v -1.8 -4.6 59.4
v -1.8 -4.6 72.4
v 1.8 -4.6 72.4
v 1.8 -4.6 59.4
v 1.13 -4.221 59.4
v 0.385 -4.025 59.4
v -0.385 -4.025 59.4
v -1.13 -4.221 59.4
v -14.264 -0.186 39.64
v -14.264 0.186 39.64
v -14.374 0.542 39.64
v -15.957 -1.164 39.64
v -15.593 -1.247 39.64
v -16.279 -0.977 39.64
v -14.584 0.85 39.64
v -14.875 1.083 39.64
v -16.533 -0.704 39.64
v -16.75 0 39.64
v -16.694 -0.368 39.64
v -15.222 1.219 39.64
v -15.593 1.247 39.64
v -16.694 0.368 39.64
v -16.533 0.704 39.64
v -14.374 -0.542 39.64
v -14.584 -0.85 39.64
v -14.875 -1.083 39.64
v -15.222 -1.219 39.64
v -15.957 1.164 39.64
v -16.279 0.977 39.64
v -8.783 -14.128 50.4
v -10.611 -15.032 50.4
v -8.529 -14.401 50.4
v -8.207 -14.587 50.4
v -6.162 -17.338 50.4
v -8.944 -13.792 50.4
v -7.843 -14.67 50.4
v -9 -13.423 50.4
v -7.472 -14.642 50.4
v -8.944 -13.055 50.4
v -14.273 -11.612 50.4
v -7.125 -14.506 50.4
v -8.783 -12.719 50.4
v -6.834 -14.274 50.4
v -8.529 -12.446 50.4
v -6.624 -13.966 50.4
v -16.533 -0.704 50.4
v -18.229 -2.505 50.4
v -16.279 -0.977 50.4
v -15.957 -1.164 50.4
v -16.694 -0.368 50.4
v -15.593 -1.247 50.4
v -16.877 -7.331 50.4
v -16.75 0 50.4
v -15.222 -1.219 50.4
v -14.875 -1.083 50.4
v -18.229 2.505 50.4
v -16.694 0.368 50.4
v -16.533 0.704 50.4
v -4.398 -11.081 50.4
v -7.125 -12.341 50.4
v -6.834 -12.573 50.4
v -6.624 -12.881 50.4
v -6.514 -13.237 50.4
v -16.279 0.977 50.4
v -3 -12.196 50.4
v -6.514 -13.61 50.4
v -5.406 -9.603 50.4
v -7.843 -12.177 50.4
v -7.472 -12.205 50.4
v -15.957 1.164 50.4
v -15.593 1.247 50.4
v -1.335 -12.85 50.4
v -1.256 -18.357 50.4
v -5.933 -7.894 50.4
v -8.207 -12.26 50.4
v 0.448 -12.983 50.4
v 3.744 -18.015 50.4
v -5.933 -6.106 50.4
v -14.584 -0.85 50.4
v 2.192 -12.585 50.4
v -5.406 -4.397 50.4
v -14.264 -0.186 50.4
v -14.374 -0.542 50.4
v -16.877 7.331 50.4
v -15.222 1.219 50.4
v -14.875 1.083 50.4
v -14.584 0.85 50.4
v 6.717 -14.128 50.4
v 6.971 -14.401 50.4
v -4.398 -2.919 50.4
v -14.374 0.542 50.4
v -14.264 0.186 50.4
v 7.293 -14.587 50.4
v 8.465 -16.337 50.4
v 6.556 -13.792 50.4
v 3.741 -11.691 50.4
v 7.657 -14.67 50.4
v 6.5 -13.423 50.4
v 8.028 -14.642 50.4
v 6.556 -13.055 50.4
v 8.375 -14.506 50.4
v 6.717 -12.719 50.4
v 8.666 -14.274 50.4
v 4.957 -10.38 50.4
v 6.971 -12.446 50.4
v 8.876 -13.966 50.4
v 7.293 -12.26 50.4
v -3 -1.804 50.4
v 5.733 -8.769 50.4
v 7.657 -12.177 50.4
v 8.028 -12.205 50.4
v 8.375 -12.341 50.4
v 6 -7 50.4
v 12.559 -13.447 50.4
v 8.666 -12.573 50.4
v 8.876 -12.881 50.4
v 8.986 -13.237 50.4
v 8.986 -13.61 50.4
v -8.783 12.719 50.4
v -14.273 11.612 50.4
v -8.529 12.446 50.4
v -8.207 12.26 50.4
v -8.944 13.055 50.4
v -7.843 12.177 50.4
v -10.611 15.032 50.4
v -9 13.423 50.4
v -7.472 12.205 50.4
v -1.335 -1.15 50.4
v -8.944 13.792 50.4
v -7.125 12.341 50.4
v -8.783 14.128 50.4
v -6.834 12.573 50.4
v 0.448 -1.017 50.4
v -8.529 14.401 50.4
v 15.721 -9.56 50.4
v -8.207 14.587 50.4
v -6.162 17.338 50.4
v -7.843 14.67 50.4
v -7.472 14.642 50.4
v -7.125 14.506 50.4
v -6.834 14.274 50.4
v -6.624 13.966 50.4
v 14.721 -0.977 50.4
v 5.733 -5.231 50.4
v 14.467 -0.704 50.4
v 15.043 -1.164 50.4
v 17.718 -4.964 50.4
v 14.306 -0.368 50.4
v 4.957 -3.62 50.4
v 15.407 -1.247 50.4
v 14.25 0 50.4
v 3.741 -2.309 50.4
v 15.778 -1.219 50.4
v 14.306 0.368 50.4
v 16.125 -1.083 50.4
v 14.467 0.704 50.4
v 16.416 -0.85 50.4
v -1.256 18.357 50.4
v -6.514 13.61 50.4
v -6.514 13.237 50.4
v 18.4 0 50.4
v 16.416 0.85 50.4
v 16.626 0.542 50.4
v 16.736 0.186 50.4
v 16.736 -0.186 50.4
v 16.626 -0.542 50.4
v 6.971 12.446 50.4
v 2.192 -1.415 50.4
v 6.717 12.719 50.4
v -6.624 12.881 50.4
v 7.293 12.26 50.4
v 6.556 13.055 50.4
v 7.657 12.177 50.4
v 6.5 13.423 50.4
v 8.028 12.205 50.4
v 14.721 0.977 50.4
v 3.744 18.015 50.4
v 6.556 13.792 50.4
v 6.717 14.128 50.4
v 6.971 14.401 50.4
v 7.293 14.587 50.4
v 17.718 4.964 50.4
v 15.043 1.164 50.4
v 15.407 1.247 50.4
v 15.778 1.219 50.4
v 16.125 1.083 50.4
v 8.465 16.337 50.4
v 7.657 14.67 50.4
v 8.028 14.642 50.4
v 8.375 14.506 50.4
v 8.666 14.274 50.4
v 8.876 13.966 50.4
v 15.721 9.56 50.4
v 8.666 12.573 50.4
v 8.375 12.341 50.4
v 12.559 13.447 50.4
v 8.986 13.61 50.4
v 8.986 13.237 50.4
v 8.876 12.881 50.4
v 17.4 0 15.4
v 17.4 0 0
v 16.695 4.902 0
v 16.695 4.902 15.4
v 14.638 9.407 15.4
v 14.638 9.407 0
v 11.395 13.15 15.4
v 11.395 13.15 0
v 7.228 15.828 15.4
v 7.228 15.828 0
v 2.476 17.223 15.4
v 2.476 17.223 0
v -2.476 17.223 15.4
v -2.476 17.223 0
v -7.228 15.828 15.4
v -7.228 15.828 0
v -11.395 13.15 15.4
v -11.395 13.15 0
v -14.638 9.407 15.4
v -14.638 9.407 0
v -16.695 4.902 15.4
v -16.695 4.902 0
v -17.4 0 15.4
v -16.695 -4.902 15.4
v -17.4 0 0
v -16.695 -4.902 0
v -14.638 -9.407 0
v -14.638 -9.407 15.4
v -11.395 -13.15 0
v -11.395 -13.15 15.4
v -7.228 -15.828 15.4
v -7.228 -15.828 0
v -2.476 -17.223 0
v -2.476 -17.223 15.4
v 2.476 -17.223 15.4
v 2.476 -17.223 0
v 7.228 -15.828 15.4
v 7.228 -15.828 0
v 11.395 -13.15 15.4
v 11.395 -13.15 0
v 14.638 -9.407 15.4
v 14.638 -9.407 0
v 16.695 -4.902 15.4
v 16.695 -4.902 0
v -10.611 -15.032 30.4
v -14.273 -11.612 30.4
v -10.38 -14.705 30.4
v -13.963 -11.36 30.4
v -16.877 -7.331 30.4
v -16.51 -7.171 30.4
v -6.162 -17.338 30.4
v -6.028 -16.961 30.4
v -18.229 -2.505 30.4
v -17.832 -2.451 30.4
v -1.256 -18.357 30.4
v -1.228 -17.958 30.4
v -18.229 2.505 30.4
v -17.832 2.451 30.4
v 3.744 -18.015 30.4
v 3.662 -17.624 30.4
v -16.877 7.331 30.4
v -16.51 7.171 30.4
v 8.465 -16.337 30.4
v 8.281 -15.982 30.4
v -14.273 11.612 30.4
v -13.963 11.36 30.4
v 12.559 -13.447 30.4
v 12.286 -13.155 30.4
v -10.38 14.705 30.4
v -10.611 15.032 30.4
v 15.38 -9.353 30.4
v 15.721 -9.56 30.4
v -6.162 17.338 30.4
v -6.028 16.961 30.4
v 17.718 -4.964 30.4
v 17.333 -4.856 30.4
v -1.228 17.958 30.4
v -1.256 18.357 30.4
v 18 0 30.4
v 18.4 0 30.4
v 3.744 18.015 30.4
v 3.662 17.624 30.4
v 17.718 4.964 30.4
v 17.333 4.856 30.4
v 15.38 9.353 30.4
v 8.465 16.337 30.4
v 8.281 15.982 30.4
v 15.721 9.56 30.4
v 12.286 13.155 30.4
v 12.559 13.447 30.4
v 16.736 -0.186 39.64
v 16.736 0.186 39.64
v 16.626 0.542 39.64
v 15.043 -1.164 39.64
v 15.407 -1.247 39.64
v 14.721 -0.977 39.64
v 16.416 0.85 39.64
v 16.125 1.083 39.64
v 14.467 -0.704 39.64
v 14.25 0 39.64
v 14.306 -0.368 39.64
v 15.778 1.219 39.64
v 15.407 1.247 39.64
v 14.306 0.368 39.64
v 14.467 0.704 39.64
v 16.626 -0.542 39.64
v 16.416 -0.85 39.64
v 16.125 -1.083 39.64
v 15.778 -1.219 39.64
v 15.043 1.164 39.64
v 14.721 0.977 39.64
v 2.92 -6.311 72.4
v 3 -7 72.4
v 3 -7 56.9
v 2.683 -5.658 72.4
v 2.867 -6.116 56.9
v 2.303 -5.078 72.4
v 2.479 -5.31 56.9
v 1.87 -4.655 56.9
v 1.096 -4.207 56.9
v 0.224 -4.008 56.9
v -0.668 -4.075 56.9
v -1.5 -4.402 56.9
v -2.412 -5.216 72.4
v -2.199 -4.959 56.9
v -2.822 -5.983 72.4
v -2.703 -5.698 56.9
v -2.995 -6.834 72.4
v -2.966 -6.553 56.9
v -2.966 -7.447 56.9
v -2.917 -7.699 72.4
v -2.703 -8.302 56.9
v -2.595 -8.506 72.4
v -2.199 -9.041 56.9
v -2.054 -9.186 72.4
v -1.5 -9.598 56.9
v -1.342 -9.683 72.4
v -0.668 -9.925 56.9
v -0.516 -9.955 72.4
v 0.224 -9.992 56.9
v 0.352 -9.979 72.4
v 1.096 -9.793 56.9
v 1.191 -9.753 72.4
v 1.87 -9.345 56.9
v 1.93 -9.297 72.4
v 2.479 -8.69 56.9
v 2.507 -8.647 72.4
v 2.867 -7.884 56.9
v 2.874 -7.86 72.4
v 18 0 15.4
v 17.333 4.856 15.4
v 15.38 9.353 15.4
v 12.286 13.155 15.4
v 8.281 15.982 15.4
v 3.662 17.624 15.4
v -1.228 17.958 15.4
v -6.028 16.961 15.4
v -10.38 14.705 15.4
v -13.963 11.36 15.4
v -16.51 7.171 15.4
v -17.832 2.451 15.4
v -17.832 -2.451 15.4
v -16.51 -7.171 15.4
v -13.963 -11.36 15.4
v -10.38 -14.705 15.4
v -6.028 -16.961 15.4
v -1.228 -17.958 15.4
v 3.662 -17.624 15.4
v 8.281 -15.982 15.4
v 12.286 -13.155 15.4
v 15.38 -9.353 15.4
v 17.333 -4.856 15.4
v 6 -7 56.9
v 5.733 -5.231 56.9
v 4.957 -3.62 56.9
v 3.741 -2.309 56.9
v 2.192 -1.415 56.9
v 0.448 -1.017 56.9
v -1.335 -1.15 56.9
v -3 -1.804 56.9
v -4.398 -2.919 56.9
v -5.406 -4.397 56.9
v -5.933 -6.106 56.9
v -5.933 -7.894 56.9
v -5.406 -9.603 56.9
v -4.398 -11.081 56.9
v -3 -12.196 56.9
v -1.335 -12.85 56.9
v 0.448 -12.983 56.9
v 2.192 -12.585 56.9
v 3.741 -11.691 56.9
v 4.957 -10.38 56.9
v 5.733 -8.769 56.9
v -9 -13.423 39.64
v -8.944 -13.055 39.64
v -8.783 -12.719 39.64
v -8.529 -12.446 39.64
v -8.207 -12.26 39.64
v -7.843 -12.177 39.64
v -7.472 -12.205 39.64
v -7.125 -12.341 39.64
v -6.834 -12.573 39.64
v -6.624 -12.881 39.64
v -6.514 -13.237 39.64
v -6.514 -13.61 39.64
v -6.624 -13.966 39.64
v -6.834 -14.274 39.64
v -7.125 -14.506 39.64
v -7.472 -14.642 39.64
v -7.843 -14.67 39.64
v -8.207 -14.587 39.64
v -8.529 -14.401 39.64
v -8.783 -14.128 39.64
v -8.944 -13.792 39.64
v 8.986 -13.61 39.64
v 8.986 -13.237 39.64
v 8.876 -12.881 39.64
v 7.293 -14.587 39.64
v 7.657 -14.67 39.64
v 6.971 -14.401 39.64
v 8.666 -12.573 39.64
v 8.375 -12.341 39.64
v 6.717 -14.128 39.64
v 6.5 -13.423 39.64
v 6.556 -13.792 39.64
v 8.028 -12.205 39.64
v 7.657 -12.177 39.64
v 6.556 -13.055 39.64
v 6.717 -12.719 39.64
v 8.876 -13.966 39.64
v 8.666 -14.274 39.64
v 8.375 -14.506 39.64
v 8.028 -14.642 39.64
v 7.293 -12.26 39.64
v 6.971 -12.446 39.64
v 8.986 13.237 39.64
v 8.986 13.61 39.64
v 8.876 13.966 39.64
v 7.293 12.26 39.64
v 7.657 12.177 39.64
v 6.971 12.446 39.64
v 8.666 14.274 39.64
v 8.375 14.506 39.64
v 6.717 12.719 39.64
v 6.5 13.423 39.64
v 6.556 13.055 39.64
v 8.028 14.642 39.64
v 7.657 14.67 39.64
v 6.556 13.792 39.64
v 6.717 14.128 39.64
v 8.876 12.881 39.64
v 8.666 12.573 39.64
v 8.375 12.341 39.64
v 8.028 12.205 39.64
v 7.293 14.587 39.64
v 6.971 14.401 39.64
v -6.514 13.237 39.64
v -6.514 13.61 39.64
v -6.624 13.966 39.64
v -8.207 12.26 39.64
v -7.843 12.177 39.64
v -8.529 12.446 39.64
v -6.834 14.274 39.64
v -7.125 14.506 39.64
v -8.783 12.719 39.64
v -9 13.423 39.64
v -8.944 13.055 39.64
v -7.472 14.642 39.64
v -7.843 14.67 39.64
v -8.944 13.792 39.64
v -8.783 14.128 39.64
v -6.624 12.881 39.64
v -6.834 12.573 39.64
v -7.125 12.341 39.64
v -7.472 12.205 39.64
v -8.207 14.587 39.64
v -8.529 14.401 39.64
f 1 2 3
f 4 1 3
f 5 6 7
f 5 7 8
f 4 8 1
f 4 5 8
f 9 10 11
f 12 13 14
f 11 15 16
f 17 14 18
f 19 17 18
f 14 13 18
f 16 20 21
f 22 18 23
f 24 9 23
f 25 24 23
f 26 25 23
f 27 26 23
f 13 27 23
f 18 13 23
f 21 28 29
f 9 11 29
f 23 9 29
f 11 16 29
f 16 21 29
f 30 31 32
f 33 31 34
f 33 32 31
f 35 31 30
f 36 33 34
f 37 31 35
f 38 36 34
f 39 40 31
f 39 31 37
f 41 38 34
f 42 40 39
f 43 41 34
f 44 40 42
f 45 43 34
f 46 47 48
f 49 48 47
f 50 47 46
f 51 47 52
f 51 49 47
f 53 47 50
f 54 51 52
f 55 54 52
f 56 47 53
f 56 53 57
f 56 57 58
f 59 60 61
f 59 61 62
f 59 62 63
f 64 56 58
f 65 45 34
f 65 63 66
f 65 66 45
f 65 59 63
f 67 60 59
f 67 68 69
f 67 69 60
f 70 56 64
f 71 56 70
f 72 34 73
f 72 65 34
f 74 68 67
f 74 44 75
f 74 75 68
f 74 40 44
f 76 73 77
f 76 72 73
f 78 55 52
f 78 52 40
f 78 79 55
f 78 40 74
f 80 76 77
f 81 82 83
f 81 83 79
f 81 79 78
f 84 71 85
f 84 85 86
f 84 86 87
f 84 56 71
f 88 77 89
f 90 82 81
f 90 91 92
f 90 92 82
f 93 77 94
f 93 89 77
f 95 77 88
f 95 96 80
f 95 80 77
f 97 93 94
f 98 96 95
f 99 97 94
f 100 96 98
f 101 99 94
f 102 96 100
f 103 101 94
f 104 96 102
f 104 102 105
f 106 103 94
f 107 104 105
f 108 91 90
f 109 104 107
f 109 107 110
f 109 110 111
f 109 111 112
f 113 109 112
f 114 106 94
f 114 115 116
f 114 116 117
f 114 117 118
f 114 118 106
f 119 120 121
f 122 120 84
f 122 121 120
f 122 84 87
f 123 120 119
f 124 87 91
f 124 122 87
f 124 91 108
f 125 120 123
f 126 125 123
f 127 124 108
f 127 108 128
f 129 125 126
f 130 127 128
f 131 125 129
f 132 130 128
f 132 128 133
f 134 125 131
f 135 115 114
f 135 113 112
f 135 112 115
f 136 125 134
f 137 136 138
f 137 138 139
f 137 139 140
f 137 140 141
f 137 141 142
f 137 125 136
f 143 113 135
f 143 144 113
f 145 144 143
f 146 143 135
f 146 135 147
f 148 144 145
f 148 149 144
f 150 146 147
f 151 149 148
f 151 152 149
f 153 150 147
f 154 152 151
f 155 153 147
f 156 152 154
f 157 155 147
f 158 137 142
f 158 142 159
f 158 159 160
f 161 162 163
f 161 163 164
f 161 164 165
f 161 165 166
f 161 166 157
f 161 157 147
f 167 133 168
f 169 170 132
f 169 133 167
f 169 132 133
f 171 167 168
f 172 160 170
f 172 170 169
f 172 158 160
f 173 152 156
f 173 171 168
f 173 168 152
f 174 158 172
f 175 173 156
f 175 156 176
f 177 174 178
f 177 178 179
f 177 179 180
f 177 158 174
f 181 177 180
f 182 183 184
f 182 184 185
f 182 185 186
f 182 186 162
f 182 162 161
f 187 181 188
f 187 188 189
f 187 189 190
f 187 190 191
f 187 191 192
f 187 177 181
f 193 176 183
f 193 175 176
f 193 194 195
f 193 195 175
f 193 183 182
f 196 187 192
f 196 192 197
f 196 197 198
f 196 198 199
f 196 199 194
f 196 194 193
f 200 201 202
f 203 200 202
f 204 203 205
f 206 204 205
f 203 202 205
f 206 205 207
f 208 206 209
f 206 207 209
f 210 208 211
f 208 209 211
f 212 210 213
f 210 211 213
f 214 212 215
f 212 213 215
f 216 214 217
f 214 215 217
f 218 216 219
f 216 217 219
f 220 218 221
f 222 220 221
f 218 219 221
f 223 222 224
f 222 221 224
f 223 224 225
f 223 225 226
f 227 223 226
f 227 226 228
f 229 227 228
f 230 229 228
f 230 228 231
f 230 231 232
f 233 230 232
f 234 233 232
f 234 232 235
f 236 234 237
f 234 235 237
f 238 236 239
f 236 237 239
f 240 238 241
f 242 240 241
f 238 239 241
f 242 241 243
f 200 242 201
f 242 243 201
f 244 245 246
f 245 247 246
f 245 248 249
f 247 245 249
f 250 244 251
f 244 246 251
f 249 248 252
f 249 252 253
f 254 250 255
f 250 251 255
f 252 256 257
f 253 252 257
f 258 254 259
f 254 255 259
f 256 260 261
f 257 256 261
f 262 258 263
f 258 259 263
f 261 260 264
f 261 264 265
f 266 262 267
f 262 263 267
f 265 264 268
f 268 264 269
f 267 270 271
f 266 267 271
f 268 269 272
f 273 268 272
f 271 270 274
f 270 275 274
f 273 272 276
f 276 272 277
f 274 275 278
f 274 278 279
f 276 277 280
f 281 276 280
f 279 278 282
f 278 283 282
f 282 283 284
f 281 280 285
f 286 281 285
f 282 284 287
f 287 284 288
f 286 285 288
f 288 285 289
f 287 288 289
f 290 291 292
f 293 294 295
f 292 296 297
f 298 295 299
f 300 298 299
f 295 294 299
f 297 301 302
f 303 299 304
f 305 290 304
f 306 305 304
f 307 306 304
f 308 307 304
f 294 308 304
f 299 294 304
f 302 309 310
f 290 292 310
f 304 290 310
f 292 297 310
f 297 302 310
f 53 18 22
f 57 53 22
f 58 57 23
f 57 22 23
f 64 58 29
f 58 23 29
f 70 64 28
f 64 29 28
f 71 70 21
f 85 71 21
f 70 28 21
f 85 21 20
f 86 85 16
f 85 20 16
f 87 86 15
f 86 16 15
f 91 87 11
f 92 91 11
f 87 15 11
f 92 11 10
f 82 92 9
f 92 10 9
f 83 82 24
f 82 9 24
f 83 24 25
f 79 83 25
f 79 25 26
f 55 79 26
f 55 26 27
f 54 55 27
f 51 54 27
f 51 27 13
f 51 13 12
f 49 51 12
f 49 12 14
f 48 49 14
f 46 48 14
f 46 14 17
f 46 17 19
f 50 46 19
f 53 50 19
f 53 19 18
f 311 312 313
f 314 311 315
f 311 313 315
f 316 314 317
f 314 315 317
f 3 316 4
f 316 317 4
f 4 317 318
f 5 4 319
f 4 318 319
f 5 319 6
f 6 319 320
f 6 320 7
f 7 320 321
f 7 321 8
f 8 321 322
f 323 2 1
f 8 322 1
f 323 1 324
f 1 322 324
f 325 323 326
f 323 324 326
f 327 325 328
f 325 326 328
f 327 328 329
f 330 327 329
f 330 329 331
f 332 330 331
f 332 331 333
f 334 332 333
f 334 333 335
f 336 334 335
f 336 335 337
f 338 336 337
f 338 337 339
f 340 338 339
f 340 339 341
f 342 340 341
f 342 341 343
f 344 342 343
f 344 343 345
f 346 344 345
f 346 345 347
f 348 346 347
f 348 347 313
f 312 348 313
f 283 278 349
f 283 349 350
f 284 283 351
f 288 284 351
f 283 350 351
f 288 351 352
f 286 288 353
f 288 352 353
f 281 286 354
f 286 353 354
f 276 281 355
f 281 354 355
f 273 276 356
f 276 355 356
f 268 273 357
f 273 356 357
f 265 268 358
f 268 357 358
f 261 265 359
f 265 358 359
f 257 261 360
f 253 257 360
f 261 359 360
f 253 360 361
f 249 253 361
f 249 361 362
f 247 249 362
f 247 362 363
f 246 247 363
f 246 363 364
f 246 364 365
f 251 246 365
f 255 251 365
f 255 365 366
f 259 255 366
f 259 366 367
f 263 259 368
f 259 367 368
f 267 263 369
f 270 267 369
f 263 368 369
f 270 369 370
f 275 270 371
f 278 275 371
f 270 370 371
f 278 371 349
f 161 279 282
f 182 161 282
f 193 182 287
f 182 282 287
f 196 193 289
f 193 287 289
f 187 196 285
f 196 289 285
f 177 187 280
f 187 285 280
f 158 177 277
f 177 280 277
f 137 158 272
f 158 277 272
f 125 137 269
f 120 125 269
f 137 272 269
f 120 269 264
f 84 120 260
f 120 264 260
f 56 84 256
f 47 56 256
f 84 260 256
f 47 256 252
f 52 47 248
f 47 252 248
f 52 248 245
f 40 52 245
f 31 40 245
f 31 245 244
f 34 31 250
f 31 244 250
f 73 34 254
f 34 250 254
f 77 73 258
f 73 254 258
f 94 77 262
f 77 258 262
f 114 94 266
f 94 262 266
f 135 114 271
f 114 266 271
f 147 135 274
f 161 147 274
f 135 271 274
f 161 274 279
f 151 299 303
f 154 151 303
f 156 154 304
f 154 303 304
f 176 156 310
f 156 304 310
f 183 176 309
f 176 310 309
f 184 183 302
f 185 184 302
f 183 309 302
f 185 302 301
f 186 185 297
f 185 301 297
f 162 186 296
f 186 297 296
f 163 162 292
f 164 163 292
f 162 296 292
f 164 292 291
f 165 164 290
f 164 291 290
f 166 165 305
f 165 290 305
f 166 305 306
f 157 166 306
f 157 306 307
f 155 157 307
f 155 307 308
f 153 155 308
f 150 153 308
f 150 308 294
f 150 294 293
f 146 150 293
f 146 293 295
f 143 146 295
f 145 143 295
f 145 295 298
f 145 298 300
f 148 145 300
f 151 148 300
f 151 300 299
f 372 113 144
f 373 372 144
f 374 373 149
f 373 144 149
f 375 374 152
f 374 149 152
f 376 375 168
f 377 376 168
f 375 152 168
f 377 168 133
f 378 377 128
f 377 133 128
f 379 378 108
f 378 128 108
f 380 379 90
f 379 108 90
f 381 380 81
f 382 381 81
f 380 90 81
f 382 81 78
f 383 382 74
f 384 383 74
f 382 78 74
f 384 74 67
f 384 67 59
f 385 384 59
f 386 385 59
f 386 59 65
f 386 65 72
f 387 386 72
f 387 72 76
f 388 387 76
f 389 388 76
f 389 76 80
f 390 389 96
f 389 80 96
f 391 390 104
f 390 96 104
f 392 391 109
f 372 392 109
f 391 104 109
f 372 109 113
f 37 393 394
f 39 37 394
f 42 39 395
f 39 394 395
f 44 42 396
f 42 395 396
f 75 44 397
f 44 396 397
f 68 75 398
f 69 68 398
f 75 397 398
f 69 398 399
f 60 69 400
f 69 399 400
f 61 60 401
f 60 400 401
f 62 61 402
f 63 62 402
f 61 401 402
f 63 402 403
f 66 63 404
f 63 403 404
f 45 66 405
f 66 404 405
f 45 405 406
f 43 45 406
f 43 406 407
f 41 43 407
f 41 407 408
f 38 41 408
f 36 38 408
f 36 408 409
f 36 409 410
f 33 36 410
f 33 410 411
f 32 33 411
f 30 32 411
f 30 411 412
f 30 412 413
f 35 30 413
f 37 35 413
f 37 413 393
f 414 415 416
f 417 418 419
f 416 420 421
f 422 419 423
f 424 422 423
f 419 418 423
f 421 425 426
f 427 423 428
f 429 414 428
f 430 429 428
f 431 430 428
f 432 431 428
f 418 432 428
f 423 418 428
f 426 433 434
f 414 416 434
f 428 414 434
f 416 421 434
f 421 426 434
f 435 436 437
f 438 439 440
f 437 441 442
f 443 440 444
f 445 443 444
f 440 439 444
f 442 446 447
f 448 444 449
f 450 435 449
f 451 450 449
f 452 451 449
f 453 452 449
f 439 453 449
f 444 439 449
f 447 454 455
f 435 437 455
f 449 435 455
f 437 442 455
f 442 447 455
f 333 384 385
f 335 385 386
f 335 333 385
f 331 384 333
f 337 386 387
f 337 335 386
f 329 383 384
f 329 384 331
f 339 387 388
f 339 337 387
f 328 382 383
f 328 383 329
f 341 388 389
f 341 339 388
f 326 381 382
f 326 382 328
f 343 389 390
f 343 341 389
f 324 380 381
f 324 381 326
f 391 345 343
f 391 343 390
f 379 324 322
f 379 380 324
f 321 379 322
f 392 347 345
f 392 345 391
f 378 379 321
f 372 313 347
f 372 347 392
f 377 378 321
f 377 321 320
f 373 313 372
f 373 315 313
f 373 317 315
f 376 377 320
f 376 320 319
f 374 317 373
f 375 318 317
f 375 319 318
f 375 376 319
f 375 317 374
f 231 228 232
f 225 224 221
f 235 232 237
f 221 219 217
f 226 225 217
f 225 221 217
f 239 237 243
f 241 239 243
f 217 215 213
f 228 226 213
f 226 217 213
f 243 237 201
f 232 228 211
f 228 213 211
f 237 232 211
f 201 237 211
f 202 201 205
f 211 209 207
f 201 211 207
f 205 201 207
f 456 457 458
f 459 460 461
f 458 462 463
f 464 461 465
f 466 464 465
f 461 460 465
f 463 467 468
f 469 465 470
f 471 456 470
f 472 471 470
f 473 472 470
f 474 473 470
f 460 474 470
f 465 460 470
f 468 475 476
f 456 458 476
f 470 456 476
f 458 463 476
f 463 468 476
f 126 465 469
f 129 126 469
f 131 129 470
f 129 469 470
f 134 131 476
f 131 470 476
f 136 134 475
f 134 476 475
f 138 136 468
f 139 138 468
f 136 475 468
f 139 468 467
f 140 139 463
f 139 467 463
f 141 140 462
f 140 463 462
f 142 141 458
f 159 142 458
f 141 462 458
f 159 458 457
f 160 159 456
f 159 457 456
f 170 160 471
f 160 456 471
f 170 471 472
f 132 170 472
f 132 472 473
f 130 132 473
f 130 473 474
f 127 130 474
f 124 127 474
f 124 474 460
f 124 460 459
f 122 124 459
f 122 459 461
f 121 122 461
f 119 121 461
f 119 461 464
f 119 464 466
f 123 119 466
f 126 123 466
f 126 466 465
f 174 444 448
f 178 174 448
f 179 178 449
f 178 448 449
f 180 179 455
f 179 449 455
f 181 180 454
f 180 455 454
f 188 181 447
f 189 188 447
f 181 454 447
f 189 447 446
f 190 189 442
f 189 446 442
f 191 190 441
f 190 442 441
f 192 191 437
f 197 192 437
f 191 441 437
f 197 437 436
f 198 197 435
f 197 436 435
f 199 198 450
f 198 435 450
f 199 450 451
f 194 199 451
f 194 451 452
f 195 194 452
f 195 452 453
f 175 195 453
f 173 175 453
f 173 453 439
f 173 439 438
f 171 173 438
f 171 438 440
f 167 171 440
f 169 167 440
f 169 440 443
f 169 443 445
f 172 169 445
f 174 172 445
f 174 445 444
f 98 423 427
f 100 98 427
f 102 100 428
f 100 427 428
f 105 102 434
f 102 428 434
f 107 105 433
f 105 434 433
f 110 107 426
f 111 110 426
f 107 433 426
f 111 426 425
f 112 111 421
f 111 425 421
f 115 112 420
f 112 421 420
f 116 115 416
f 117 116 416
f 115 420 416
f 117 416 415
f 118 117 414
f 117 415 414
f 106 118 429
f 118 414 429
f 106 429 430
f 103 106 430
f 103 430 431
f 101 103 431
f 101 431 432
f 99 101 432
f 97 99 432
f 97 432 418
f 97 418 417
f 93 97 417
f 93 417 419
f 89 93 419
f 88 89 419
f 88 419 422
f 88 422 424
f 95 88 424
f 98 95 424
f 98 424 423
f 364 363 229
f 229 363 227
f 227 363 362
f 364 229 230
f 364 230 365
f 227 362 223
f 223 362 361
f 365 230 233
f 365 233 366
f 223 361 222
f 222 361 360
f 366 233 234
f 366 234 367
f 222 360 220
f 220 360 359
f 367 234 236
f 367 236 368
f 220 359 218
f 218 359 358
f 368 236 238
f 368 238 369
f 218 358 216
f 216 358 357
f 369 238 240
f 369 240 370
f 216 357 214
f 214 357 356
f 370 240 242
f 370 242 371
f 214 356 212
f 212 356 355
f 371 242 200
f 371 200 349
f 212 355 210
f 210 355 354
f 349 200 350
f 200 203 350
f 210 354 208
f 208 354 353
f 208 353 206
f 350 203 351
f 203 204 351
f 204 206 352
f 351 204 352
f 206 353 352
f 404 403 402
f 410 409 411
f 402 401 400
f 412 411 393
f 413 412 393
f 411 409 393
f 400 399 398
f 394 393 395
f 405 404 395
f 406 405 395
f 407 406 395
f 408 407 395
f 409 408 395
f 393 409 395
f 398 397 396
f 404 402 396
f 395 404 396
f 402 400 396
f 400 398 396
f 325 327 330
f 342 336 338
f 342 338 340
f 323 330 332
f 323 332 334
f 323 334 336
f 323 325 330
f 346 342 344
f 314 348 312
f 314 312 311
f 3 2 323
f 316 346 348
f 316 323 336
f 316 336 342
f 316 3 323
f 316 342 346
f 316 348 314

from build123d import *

# Parameters (mm, degrees)
SKETCH1_R                       = 17.4
BOSS_EXTRUDE1_DEPTH             = 15.4
SKETCH2_R                       = 18
BOSS_EXTRUDE2_DEPTH             = 15
SKETCH3_R                       = 18.4
BOSS_EXTRUDE3_DEPTH             = 20
SKETCH4_R                       = 6
BOSS_EXTRUDE4_DEPTH             = 6.5
SKETCH5_R                       = 3
BOSS_EXTRUDE5_DEPTH             = 15.5
CUT_EXTRUDE1_DEPTH              = 13
TAP_DRILL_FOR_M3X0_5_TAP1_D     = 2.5
TAP_DRILL_FOR_M3X0_5_TAP1_DEPTH = 10.76


with BuildPart() as part:
    # Sketch1 → Boss-Extrude1 (new body)
    with BuildSketch(Plane.XY):
        Circle(SKETCH1_R)
    extrude(amount=BOSS_EXTRUDE1_DEPTH)

    # Sketch2 → Boss-Extrude2 (add)
    with BuildSketch(Plane.XY.offset(15.4)):
        Circle(SKETCH2_R)
    extrude(amount=BOSS_EXTRUDE2_DEPTH)

    # Sketch3 → Boss-Extrude3 (add)
    with BuildSketch(Plane.XY.offset(30.4)):
        Circle(SKETCH3_R)
    extrude(amount=BOSS_EXTRUDE3_DEPTH)

    # Sketch4 → Boss-Extrude4 (add)
    with BuildSketch(Plane.XY.offset(50.4)):
        with Locations((0, -7)):
            Circle(SKETCH4_R)
    extrude(amount=BOSS_EXTRUDE4_DEPTH)

    # Sketch5 → Boss-Extrude5 (add)
    with BuildSketch(Plane.XY.offset(56.9)):
        with Locations((0, -7)):
            Circle(SKETCH5_R)
    extrude(amount=BOSS_EXTRUDE5_DEPTH)

    # Sketch6 → Cut-Extrude1 (cut)
    with BuildSketch(Plane.XY.offset(72.4)):
        with BuildLine():
            Line((-1.8, -4.6), (1.8, -4.6))
            ThreePointArc((1.8, -4.6), (0, -4), (-1.8, -4.6))
        make_face()
    extrude(amount=-CUT_EXTRUDE1_DEPTH, mode=Mode.SUBTRACT)

    # Tap Drill for M3x0.5 Tap1
    with Locations(Plane.XY.offset(50.4)):
        with Locations((-15.5, 0), (-7.75, 13.423393759), (7.75, 13.423393759), (15.5, 0), (7.75, -13.423393759), (-7.75, -13.423393759)):
            Hole(TAP_DRILL_FOR_M3X0_5_TAP1_D / 2, depth=TAP_DRILL_FOR_M3X0_5_TAP1_DEPTH)


solid = part.part
